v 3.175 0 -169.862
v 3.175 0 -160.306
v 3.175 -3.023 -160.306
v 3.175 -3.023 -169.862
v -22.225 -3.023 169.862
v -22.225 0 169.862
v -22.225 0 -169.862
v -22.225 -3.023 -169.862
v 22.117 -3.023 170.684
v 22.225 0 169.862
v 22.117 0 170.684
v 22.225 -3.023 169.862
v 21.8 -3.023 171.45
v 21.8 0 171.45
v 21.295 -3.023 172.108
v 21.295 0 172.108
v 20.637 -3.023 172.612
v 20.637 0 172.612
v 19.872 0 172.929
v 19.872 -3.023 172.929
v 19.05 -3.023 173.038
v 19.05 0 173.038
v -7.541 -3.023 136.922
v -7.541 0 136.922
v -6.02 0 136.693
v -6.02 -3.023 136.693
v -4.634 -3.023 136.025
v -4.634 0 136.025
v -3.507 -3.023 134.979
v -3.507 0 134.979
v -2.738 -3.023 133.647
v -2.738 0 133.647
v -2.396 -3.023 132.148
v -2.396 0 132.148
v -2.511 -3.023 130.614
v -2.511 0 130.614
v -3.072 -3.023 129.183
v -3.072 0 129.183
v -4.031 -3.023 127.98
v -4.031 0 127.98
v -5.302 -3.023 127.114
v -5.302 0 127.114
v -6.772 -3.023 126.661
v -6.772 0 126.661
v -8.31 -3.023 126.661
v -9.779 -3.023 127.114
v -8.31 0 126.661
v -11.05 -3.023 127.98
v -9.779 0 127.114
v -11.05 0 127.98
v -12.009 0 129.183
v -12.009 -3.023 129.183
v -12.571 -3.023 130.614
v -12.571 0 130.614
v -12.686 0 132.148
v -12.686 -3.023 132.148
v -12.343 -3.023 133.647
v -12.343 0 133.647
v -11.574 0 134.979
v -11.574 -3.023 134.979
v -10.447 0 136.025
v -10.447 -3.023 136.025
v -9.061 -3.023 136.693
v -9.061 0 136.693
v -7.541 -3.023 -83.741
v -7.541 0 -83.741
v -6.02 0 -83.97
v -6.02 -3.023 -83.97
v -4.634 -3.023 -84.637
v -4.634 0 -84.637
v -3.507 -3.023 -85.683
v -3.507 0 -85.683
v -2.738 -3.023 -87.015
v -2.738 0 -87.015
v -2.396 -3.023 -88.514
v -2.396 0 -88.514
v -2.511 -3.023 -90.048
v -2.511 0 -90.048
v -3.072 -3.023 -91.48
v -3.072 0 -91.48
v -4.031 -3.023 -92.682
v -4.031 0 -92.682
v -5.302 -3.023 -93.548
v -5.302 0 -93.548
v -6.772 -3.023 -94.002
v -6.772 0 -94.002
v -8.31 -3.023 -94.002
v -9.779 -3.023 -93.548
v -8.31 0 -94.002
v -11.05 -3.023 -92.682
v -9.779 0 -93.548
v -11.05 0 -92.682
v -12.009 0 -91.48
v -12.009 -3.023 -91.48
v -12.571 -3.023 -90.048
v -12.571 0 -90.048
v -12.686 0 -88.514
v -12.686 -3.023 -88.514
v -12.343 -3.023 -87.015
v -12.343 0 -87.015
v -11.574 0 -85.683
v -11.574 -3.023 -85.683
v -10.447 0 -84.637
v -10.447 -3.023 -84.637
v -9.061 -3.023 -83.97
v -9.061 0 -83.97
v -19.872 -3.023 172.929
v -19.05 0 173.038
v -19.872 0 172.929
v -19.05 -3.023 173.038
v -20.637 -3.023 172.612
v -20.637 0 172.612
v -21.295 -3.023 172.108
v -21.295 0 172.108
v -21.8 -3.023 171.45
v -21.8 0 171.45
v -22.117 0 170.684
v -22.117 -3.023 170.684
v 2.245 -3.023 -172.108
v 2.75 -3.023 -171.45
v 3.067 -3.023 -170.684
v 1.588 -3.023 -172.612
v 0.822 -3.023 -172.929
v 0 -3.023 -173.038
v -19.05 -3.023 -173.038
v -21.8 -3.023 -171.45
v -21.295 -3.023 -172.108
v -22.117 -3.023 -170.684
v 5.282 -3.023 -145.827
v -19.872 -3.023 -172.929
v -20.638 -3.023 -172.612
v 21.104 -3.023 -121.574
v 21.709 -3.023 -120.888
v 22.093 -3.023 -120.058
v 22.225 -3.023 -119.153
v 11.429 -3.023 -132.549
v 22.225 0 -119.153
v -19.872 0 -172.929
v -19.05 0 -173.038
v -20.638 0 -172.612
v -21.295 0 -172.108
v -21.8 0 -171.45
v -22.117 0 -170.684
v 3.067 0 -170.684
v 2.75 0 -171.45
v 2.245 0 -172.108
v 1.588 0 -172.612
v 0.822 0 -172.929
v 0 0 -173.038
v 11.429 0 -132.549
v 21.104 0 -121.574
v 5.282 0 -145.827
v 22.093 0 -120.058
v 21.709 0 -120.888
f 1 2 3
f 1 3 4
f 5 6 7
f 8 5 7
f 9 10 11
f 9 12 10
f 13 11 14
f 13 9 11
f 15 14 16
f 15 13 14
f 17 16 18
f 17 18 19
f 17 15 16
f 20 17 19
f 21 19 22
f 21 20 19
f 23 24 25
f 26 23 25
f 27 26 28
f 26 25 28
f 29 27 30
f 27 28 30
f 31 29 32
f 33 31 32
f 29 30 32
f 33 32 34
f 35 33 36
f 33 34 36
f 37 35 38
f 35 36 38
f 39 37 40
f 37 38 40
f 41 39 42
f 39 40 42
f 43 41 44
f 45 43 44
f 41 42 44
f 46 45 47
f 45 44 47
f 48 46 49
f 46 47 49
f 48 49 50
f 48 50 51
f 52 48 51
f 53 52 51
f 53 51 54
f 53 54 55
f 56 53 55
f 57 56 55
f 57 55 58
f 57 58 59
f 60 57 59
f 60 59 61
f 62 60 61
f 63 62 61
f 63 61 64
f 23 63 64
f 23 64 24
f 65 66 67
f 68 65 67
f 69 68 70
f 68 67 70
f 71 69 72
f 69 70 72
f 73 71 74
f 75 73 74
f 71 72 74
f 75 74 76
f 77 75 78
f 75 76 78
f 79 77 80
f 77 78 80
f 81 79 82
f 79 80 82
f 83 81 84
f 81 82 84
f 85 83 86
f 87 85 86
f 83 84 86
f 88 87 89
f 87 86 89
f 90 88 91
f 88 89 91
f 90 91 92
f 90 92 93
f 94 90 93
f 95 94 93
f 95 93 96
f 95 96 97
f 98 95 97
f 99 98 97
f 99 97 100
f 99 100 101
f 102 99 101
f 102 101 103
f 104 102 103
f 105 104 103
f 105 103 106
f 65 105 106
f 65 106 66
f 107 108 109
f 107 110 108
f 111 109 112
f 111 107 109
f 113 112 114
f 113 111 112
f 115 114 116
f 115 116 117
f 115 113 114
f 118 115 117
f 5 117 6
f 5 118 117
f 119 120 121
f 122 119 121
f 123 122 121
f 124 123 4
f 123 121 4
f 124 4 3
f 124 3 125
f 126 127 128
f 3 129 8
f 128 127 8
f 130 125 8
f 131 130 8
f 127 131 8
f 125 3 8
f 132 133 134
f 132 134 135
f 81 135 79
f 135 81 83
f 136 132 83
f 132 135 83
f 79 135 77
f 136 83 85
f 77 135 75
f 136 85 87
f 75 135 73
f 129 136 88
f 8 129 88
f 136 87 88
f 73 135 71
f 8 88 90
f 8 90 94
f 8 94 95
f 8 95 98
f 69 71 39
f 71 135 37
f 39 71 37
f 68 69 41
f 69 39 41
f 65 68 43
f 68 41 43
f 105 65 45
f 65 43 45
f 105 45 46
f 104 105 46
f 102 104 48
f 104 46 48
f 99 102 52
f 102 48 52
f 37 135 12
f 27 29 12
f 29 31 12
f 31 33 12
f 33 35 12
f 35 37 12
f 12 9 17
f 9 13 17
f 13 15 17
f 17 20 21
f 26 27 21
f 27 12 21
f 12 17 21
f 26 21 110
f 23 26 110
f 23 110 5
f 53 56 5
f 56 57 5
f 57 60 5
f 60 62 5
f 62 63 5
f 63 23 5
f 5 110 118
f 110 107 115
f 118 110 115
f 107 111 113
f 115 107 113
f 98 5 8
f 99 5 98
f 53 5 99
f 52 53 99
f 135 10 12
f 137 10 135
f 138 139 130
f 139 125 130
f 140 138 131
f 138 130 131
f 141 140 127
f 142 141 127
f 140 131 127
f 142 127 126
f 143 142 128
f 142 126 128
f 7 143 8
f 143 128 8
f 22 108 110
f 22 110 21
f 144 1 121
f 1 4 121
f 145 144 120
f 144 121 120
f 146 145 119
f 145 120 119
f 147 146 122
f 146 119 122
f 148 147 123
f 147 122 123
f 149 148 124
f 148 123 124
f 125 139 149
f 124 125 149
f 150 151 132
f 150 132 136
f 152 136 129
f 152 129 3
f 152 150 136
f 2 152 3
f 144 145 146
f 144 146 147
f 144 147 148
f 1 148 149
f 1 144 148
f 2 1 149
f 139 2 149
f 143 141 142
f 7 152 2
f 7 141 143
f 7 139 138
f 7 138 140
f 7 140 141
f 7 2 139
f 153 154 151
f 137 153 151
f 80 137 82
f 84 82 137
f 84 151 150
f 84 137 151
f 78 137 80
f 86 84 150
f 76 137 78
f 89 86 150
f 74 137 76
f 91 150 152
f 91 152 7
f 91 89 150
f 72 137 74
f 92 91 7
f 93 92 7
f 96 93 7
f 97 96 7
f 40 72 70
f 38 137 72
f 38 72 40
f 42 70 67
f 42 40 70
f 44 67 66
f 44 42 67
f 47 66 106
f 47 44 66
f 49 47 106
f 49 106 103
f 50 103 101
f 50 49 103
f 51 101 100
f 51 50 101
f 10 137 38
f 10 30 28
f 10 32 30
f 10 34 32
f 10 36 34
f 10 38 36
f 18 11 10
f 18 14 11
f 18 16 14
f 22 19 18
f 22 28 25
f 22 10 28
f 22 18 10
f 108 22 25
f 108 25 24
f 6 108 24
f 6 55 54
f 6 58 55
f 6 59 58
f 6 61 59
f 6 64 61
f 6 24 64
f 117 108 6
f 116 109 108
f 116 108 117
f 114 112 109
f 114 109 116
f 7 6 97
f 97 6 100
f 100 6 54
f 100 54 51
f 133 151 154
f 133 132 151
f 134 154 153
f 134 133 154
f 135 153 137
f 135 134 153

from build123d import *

# Parameters (mm, degrees)
SKETCH1_W          = 44.45
SKETCH1_H          = 346.075
BASE_FLANGE1_DEPTH = 3.0226
CUT_EXTRUDE1_REACH = 176.485
SKETCH6_R          = 5.159375
SKETCH6_W          = 19.05
SKETCH6_H          = 52.3875
FILLET2_R          = 50.8
FILLET3_R          = 3.175


# Sheet-metal steps are written as plain solids
with BuildPart() as part:
    # Sketch1 → Base-Flange1 (new body)
    with BuildSketch(Plane(origin=(0, 0, 0), x_dir=(1, 0, 0), z_dir=(0, 1, 0))):
        Rectangle(SKETCH1_W, SKETCH1_H)
    extrude(amount=-BASE_FLANGE1_DEPTH)

    # Sketch6 → Cut-Extrude1 (cut, up to next)
    with BuildSketch(Plane(origin=(0, 0, 0), x_dir=(1, 0, 0), z_dir=(0, 1, 0)), mode=Mode.PRIVATE) as cut_extrude1_sk1:
        with Locations(Location((-7.540625, -131.7625, 0), (0, 0, 270))):
            Circle(SKETCH6_R)
    cut_extrude1_tool1 = extrude(cut_extrude1_sk1.sketch, amount=-CUT_EXTRUDE1_REACH, mode=Mode.PRIVATE) & part.part
    # Sketch6 → Cut-Extrude1 (cut, up to next)
    with BuildSketch(Plane(origin=(0, 0, 0), x_dir=(1, 0, 0), z_dir=(0, 1, 0)), mode=Mode.PRIVATE) as cut_extrude1_sk2:
        with Locations(Location((-7.540625, 88.9, 0), (0, 0, 270))):
            Circle(SKETCH6_R)
    cut_extrude1_tool2 = extrude(cut_extrude1_sk2.sketch, amount=-CUT_EXTRUDE1_REACH, mode=Mode.PRIVATE) & part.part
    # Sketch6 → Cut-Extrude1 (cut, up to next)
    with BuildSketch(Plane(origin=(0, 0, 0), x_dir=(1, 0, 0), z_dir=(0, 1, 0)), mode=Mode.PRIVATE) as cut_extrude1_sk3:
        with Locations((12.7, 146.84375)):
            Rectangle(SKETCH6_W, SKETCH6_H)
    cut_extrude1_tool3 = extrude(cut_extrude1_sk3.sketch, amount=-CUT_EXTRUDE1_REACH, mode=Mode.PRIVATE) & part.part
    add(cut_extrude1_tool1.solids().sort_by_distance((-7.540625, 0, 131.7625))[0], mode=Mode.SUBTRACT)
    add(cut_extrude1_tool2.solids().sort_by_distance((-7.540625, 0, -88.9))[0], mode=Mode.SUBTRACT)
    add(cut_extrude1_tool3.solids().sort_by_distance((12.7, 0, -146.84375))[0], mode=Mode.SUBTRACT)

    # Fillet2
    # the kernel refuses this fillet: 50.8 mm, written as the material it adds along each edge
    with BuildSketch(Plane(origin=(3.175, 0, -120.65), x_dir=(1, 0, 0), z_dir=(0, -1, 0))) as fillet2_piece_1:
        with BuildLine():
            CenterArc((50.8, -39.65573729), FILLET2_R, 128.682187453, 51.317812547)
            Line((0, -39.65573729), (-1.016, -39.65573729))
            Line((-1.016, -39.65573729), (-1.016, 0))
            Line((-1.016, 0), (0, 1.016))
            ThreePointArc((0, 1.016), (9.525, 1.016), (18.415, 0.793114746))
            Line((18.415, 0.793114746), (19.05, 0))
        make_face()
    extrude(amount=3.0226)

    # Fillet3
    fillet3_edges = [part.edges().sort_by_distance(p)[0] for p in [
        (22.225, -1.5113, -120.65),
        (3.175, -1.5113, -173.0375),
        (-22.225, -1.5113, -173.0375),
        (22.225, -1.5113, 173.0375),
        (-22.225, -1.5113, 173.0375),
    ]]
    fillet(fillet3_edges, radius=FILLET3_R)


solid = part.part
